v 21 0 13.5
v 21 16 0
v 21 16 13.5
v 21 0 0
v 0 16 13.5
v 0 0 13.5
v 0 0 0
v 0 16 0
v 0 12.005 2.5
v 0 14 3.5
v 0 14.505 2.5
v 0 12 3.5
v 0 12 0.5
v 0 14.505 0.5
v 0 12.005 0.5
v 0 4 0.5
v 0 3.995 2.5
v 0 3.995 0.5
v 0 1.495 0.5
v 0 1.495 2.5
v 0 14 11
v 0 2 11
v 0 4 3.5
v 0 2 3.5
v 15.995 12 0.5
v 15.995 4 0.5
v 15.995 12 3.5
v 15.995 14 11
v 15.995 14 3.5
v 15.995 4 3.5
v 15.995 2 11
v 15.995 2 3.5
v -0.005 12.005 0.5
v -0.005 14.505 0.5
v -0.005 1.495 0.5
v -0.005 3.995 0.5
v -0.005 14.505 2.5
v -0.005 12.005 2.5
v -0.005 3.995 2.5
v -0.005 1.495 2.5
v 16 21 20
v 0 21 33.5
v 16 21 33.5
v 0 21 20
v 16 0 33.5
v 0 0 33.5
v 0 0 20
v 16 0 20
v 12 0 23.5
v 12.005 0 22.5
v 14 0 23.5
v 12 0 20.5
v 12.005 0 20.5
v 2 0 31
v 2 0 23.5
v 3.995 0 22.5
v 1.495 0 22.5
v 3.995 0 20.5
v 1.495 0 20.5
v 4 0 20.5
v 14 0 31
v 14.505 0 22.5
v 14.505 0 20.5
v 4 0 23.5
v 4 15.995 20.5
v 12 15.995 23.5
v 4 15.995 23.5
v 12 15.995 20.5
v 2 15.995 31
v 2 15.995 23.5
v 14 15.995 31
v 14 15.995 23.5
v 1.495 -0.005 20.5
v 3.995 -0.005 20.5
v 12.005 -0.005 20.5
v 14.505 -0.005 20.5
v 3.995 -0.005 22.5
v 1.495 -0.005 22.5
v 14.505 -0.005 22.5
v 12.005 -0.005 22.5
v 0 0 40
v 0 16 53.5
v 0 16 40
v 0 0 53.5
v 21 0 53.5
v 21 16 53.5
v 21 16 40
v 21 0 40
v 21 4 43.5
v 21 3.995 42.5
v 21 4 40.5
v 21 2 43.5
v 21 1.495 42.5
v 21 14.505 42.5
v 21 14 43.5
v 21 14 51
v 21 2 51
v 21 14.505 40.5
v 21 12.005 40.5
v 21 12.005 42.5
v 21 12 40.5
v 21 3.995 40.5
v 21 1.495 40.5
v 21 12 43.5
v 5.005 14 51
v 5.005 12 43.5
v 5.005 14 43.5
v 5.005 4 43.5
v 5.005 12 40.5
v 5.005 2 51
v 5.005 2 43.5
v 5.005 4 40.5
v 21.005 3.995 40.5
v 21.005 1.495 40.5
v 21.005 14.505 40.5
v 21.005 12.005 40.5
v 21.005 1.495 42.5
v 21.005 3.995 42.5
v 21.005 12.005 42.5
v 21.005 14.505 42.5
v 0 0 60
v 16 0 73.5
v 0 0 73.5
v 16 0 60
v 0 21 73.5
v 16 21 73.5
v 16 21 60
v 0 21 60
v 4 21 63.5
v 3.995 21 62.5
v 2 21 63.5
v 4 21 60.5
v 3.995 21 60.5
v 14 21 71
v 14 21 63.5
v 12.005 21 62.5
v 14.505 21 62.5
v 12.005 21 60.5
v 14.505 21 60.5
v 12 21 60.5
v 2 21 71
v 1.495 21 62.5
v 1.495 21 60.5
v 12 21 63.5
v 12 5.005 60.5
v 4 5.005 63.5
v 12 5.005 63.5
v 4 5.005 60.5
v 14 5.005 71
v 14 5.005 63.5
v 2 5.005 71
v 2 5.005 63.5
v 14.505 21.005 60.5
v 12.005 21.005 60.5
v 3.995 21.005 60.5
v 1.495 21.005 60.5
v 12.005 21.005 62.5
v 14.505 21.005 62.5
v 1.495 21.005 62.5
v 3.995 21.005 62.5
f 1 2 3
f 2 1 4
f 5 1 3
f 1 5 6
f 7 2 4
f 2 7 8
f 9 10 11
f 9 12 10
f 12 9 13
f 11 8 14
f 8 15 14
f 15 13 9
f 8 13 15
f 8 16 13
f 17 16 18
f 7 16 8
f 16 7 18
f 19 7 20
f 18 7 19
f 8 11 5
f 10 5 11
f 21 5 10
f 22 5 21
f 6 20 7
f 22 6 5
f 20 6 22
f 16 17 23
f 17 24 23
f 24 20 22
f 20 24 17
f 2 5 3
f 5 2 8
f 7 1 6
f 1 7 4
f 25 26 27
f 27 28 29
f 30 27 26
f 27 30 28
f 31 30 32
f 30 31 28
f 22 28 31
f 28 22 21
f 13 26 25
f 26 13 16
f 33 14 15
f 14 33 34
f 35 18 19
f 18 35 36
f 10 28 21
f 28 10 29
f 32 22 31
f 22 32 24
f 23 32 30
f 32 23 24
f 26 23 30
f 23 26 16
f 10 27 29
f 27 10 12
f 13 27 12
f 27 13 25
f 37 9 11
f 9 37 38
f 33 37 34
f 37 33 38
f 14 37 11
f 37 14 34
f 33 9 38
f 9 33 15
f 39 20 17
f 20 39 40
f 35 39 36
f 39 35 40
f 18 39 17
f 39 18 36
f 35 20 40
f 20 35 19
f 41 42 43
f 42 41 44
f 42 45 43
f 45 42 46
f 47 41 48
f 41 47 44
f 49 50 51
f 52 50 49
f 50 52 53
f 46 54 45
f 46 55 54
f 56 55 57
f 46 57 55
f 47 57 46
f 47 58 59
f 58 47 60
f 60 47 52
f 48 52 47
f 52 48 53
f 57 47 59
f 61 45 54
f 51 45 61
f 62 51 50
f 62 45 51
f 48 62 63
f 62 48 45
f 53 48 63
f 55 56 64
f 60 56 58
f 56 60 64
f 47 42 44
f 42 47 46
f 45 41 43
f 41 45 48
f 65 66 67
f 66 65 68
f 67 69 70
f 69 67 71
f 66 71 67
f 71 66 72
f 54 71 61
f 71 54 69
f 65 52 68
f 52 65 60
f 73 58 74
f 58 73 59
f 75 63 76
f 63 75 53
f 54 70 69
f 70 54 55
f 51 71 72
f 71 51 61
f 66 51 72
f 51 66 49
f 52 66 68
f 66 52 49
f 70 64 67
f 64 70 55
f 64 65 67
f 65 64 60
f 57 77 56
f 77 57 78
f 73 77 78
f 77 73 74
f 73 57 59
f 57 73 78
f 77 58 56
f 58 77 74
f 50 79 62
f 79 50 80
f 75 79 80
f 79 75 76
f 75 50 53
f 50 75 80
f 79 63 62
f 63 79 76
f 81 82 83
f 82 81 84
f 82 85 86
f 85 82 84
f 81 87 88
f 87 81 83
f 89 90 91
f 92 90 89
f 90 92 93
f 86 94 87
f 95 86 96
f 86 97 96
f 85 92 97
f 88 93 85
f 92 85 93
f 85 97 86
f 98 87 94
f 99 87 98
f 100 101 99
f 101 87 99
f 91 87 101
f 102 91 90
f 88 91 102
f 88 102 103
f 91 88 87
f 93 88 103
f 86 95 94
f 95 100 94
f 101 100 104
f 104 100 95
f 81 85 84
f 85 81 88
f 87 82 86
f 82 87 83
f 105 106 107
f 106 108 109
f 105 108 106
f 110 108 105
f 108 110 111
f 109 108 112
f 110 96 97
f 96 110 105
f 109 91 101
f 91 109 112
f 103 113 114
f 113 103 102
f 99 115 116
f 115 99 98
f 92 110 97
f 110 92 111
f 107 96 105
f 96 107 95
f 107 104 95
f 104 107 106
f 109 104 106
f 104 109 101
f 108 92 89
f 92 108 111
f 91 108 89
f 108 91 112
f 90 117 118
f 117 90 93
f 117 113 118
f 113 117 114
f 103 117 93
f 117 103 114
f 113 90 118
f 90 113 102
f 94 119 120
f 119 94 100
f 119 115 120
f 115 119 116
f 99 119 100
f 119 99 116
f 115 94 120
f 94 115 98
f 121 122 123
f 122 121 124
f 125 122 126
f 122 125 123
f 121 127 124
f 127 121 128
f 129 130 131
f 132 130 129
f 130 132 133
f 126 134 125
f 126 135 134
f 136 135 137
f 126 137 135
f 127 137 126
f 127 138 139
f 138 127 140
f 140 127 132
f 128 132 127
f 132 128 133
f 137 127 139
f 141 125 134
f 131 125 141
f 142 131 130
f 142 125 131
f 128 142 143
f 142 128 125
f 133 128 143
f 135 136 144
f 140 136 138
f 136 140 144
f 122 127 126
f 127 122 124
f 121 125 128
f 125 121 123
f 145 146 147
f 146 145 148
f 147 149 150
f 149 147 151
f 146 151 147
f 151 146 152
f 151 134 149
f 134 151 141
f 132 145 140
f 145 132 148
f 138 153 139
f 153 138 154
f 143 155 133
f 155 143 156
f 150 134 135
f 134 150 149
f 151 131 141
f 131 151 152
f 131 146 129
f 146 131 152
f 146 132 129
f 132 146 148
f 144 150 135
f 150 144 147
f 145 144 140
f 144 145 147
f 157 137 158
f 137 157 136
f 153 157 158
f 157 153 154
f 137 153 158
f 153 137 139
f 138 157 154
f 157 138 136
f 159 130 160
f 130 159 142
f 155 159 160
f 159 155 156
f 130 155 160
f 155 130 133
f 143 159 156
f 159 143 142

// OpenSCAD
// Copyright (c) 2017 Clément Bœsch <u pkh.me>
//
// Permission to use, copy, modify, and distribute this software for any
// purpose with or without fee is hereby granted, provided that the above
// copyright notice and this permission notice appear in all copies.
//
// THE SOFTWARE IS PROVIDED "AS IS" AND THE AUTHOR DISCLAIMS ALL WARRANTIES
// WITH REGARD TO THIS SOFTWARE INCLUDING ALL IMPLIED WARRANTIES OF
// MERCHANTABILITY AND FITNESS. IN NO EVENT SHALL THE AUTHOR BE LIABLE FOR
// ANY SPECIAL, DIRECT, INDIRECT, OR CONSEQUENTIAL DAMAGES OR ANY DAMAGES
// WHATSOEVER RESULTING FROM LOSS OF USE, DATA OR PROFITS, WHETHER IN AN
// ACTION OF CONTRACT, NEGLIGENCE OR OTHER TORTIOUS ACTION, ARISING OUT OF
// OR IN CONNECTION WITH THE USE OR PERFORMANCE OF THIS SOFTWARE.

$fn = 30;

_delta = 0.005;
_c_metal = [.7, .7, .7];
_c_black = [.3, .3, .3];

module _set_flipped(dim, flipped) {
    if (flipped) {
        translate([0, dim[1], dim[2]])
            rotate([180, 0, 0])
                children();
    } else {
        children();
    }
}

module _set_direction(dim, direction) {
    if (direction == "N")
        translate([0, dim[0], 0])
            rotate([0, 0, -90])
                children();
    else if (direction == "S")
        translate([dim[1], 0, 0])
            rotate([0, 0, 90])
                children();
    else if (direction == "E")
        translate([dim[0], dim[1], 0])
            rotate([0, 0, 180])
                children();
    else if (direction == "W")
        children();
}

module _set_orient(dim, direction, flipped) {
    //%cube(dim);
    _set_direction(dim, direction)
        _set_flipped(dim, flipped)
            children();
}

module _ethernet(dim) {
    l = dim[0];
    w = dim[1];
    h = dim[2];

    difference() {
        color(_c_metal)
            cube(dim);
        translate([-_delta, 2, 0.5])
            color(_c_black)
                cube([l-5, w-4, h-3]);
    }

    color(_c_black)
        for (y = [2, w-4])
            translate([0, y, 0.5])
                cube([l-1, 2, 3]);

    color([.3, .9, .3])
        translate([-_delta, w-4+_delta, .5])
            cube([1, 2.5, 2]);

    color([.9, .9, .3])
        translate([-_delta, 1.5-_delta, .5])
            cube([1, 2.5, 2]);
}

module _usb(dim, n=1, clr="white") {
    pin_l = .6;
    l = dim[0] - pin_l;
    w = dim[1] - pin_l*2;
    h = dim[2] - pin_l*2;

    t = 0.25;
    p = 0.75;
    z = pin_l * sqrt(2);

    translate([pin_l, pin_l, pin_l]) {
        color(_c_metal) {
            difference() {
                cube([l, w, h]);
                translate([-_delta, t, t])
                    cube([l-t+_delta, w-t*2, h-t*2]);
            }
            translate([0,   p, h-t]) rotate(a= 45, v=[0,1,0]) translate([-z,  0,  0]) cube([z, w - 2*p,       t]);
            translate([0,   p,   t]) rotate(a=-45, v=[0,1,0]) translate([-z,  0, -t]) cube([z, w - 2*p,       t]);
            translate([0,   t,   p]) rotate(a= 45, v=[0,0,1]) translate([-z, -t,  0]) cube([z,       t, h - 2*p]);
            translate([0, w-t,   p]) rotate(a=-45, v=[0,0,1]) translate([-z,  0,  0]) cube([z,       t, h - 2*p]);
        }
        color(clr)
            for (y = [0:n-1])
                translate([0, 1, h-(3.5+9*y)]) // XXX: random shit
                    cube([l-t, w-2, 2]);
    }
    color(_c_metal)
        translate([pin_l+l-l/3, pin_l])
            cube([l/3, w, pin_l]);
}

module _usbx2(dim) {
    _usb(dim, n=2, clr=_c_black);

    // separator (XXX: random shit)
    pin_l = .6;
    t = 0.25;
    l = dim[0] - pin_l - t;
    w = dim[1] - pin_l*2 - t*2;
    color(_c_metal)
        translate([0, (dim[1]-w)/2, (dim[2]-3.5)/2])
            cube([l, w, 3.5]);
}

module _pins_pos(dim, n, m, pins_dist) { // centered position for the pins
    l = dim[0];
    w = dim[1];
    pl = (n - 1) * pins_dist;
    pw = (m - 1) * pins_dist;
    if (l <= pl) echo("WARN: female header length looks too small");
    if (w <= pw) echo("WARN: female header width looks too small");
    translate([(l-pl)/2, (w-pw)/2])
        for (y = [0:m-1])
            for (x = [0:n-1])
                translate([x * pins_dist, y * pins_dist])
                    children();
}

module _female_header(dim, n, m, pins_sz, pins_dist) {
    h = dim[2];
    color(_c_black) {
        difference() {
            cube(dim);
            translate([0, 0, _delta])
                linear_extrude(height=h-.25)
                    _pins_pos(dim, n, m, pins_dist)
                        square(pins_sz, center=true);
            translate([0, 0, h-.25])
                _pins_pos(dim, n, m, pins_dist)
                    rotate(45)
                        cylinder(d1=pins_sz*sqrt(2), d2=1.25+pins_sz, h=.25+_delta, $fn=4);
        }
    }
}

module _pins_slot(n, u) {
    x = u/4;
    z = u/2;
    h = u*n;
    slot_polygons = [
        [-z/2, h/2], [ z/2, h/2], [ u/2, h/2-x], [ u/2,-h/2+x],
        [ z/2,-h/2], [-z/2,-h/2], [-u/2,-h/2+x], [-u/2, h/2-x],
    ];
    polygon(slot_polygons);
}

module _pin_header(dim, n, m, pins_sz, pins_dist) {
    l = dim[0];
    w = dim[1];
    h = dim[2];
    color(_c_metal)
        linear_extrude(height=h)
            _pins_pos(dim, n, m, pins_dist)
                square(pins_sz, center=true);
    pl = (n - 1) * pins_dist;
    color(_c_black)
        linear_extrude(height=h/4)
            translate([(l-pl)/2, w/2])
                for (x = [0:n-1])
                    translate([x * pins_dist, 0])
                        _pins_slot(m, pins_dist);
}

_default_ethernet_dim = [21, 16, 13.5];
_default_usb_dim      = [14, 14.5, 8];
_default_usbx2_dim    = [17.5, 14.5, 16];
_default_hdmi_dim     = [11.5, 15, 6];
_default_microusb_dim = [6, 8, 3];
_default_jack_dim     = [12+2, 6.5, 5];

module _hdmi(dim) {
    l = dim[0];
    w = dim[1];
    h = dim[2];
    lowest = h - 5.25;
    hdmi_polygon_pos = [[0, h], [w, h], [w, h-3.25],
                        [w-2, lowest], [2, lowest], [0, h-3.25]];
    color(_c_metal) {
        translate([7, 0, 0])
            cube([l-7, w, h]);
        rotate([90, 0, 90]) {
            linear_extrude(height=7) {
                difference() {
                    polygon(hdmi_polygon_pos);
                    offset(r=-.5)
                        polygon(hdmi_polygon_pos);
                }
            }
        }
    }
    color(_c_black)
        translate([2, 2, 3])
            cube([7, w-2*2, 1]);
}

module _microusb(dim) {
    l = dim[0];
    w = dim[1];
    h = dim[2];
    microusb_polygon_pos = [[1, h], [w-1, h], [w, h-1],
                            [w-2, 0], [2, 0], [0, h-1]];
    color(_c_metal) {
        translate([l-1, 0])
            cube([1, w, h]);
        rotate([90, 0, 90]) {
            linear_extrude(height=l-1) {
                difference() {
                    polygon(microusb_polygon_pos);
                    offset(r=-.5)
                        polygon(microusb_polygon_pos);
                }
            }
        }
    }
    color(_c_black)
        translate([1.5, (w-4)/2, h-1.5])
            cube([l-2.5, 4, .5]);
}

module _jack(dim) {
    l = dim[0];
    w = dim[1];
    h = dim[2];

    lcyl = 2;
    color(_c_black) {
        difference() {
            union() {
                translate([lcyl, 0, 0])
                    cube([l-lcyl, w, h]);
                translate([0, w/2, h/2])
                    rotate([90, 0, 90])
                        cylinder(d=h, h=lcyl);
            }
            translate([-_delta/2, w/2, h/2])
                rotate([90, 0, 90])
                    cylinder(d=3.5, h=l+_delta);
        }
    }
}

module ethernet(dim=_default_ethernet_dim, direction="W", flipped=false) {
    _set_orient(dim, direction, flipped)
        _ethernet(dim);
}

module usb(dim=_default_usb_dim, direction="W", flipped=false) {
    _set_orient(dim, direction, flipped)
        _usb(dim);
}

module usbx2(dim=_default_usbx2_dim, direction="W", flipped=false) {
    _set_orient(dim, direction, flipped)
        _usbx2(dim);
}

module hdmi(dim=_default_hdmi_dim, direction="W", flipped=false) {
    _set_orient(dim, direction, flipped)
        _hdmi(dim);
}

module microusb(dim=_default_microusb_dim, direction="W", flipped=false) {
    _set_orient(dim, direction, flipped)
        _microusb(dim);
}

module jack(dim=_default_jack_dim, direction="W", flipped=false) {
    _set_orient(dim, direction, flipped)
        _jack(dim);
}

function _dim254(dim, n, m) = [
        dim[0] ? dim[0] : n*2.54,
        dim[1] ? dim[1] : m*2.5,
        dim[2] ? dim[2] : 8.5,
];

function _dim200(dim, n, m) = [
        dim[0] ? dim[0] : n*2,
        dim[1] ? dim[1] : m*2,
        dim[2] ? dim[2] : 4.5,
];

module female_header_pitch254(n, m, dim=[0,0,0], direction="W", flipped=false) {
    dim = _dim254(dim, n, m);
    _set_orient(dim, direction, flipped)
        _female_header(dim, n, m, pins_sz=.64, pins_dist=2.54);
}

module female_header_pitch200(n, m, dim=[0,0,0], direction="W", flipped=false) {
    dim = _dim200(dim, n, m);
    _set_orient(dim, direction, flipped)
        _female_header(dim, n, m, pins_sz=.50, pins_dist=2);
}

module pin_header_pitch254(n, m, dim=[0,0,0], direction="W", flipped=false) {
    dim = _dim254(dim, n, m);
    _set_orient(dim, direction, flipped)
        _pin_header(dim, n, m, pins_sz=.64, pins_dist=2.54);
}

module pin_header_pitch200(n, m, dim=[0,0,0], direction="W", flipped=false) {
    dim = _dim200(dim, n, m);
    _set_orient(dim, direction, flipped)
        _pin_header(dim, n, m, pins_sz=.50, pins_dist=2);
}

module _test_orient(dim, flipped, pad=20) {
    translate([0, 0, 0*pad]) _set_orient(dim, "W", flipped) children();
    translate([0, 0, 1*pad]) _set_orient(dim, "S", flipped) children();
    translate([0, 0, 2*pad]) _set_orient(dim, "E", flipped) children();
    translate([0, 0, 3*pad]) _set_orient(dim, "N", flipped) children();
}

_test_orient(_default_ethernet_dim, flipped=false)
    ethernet();
    //usb();
    //hdmi();
    //microusb();
    //jack();
